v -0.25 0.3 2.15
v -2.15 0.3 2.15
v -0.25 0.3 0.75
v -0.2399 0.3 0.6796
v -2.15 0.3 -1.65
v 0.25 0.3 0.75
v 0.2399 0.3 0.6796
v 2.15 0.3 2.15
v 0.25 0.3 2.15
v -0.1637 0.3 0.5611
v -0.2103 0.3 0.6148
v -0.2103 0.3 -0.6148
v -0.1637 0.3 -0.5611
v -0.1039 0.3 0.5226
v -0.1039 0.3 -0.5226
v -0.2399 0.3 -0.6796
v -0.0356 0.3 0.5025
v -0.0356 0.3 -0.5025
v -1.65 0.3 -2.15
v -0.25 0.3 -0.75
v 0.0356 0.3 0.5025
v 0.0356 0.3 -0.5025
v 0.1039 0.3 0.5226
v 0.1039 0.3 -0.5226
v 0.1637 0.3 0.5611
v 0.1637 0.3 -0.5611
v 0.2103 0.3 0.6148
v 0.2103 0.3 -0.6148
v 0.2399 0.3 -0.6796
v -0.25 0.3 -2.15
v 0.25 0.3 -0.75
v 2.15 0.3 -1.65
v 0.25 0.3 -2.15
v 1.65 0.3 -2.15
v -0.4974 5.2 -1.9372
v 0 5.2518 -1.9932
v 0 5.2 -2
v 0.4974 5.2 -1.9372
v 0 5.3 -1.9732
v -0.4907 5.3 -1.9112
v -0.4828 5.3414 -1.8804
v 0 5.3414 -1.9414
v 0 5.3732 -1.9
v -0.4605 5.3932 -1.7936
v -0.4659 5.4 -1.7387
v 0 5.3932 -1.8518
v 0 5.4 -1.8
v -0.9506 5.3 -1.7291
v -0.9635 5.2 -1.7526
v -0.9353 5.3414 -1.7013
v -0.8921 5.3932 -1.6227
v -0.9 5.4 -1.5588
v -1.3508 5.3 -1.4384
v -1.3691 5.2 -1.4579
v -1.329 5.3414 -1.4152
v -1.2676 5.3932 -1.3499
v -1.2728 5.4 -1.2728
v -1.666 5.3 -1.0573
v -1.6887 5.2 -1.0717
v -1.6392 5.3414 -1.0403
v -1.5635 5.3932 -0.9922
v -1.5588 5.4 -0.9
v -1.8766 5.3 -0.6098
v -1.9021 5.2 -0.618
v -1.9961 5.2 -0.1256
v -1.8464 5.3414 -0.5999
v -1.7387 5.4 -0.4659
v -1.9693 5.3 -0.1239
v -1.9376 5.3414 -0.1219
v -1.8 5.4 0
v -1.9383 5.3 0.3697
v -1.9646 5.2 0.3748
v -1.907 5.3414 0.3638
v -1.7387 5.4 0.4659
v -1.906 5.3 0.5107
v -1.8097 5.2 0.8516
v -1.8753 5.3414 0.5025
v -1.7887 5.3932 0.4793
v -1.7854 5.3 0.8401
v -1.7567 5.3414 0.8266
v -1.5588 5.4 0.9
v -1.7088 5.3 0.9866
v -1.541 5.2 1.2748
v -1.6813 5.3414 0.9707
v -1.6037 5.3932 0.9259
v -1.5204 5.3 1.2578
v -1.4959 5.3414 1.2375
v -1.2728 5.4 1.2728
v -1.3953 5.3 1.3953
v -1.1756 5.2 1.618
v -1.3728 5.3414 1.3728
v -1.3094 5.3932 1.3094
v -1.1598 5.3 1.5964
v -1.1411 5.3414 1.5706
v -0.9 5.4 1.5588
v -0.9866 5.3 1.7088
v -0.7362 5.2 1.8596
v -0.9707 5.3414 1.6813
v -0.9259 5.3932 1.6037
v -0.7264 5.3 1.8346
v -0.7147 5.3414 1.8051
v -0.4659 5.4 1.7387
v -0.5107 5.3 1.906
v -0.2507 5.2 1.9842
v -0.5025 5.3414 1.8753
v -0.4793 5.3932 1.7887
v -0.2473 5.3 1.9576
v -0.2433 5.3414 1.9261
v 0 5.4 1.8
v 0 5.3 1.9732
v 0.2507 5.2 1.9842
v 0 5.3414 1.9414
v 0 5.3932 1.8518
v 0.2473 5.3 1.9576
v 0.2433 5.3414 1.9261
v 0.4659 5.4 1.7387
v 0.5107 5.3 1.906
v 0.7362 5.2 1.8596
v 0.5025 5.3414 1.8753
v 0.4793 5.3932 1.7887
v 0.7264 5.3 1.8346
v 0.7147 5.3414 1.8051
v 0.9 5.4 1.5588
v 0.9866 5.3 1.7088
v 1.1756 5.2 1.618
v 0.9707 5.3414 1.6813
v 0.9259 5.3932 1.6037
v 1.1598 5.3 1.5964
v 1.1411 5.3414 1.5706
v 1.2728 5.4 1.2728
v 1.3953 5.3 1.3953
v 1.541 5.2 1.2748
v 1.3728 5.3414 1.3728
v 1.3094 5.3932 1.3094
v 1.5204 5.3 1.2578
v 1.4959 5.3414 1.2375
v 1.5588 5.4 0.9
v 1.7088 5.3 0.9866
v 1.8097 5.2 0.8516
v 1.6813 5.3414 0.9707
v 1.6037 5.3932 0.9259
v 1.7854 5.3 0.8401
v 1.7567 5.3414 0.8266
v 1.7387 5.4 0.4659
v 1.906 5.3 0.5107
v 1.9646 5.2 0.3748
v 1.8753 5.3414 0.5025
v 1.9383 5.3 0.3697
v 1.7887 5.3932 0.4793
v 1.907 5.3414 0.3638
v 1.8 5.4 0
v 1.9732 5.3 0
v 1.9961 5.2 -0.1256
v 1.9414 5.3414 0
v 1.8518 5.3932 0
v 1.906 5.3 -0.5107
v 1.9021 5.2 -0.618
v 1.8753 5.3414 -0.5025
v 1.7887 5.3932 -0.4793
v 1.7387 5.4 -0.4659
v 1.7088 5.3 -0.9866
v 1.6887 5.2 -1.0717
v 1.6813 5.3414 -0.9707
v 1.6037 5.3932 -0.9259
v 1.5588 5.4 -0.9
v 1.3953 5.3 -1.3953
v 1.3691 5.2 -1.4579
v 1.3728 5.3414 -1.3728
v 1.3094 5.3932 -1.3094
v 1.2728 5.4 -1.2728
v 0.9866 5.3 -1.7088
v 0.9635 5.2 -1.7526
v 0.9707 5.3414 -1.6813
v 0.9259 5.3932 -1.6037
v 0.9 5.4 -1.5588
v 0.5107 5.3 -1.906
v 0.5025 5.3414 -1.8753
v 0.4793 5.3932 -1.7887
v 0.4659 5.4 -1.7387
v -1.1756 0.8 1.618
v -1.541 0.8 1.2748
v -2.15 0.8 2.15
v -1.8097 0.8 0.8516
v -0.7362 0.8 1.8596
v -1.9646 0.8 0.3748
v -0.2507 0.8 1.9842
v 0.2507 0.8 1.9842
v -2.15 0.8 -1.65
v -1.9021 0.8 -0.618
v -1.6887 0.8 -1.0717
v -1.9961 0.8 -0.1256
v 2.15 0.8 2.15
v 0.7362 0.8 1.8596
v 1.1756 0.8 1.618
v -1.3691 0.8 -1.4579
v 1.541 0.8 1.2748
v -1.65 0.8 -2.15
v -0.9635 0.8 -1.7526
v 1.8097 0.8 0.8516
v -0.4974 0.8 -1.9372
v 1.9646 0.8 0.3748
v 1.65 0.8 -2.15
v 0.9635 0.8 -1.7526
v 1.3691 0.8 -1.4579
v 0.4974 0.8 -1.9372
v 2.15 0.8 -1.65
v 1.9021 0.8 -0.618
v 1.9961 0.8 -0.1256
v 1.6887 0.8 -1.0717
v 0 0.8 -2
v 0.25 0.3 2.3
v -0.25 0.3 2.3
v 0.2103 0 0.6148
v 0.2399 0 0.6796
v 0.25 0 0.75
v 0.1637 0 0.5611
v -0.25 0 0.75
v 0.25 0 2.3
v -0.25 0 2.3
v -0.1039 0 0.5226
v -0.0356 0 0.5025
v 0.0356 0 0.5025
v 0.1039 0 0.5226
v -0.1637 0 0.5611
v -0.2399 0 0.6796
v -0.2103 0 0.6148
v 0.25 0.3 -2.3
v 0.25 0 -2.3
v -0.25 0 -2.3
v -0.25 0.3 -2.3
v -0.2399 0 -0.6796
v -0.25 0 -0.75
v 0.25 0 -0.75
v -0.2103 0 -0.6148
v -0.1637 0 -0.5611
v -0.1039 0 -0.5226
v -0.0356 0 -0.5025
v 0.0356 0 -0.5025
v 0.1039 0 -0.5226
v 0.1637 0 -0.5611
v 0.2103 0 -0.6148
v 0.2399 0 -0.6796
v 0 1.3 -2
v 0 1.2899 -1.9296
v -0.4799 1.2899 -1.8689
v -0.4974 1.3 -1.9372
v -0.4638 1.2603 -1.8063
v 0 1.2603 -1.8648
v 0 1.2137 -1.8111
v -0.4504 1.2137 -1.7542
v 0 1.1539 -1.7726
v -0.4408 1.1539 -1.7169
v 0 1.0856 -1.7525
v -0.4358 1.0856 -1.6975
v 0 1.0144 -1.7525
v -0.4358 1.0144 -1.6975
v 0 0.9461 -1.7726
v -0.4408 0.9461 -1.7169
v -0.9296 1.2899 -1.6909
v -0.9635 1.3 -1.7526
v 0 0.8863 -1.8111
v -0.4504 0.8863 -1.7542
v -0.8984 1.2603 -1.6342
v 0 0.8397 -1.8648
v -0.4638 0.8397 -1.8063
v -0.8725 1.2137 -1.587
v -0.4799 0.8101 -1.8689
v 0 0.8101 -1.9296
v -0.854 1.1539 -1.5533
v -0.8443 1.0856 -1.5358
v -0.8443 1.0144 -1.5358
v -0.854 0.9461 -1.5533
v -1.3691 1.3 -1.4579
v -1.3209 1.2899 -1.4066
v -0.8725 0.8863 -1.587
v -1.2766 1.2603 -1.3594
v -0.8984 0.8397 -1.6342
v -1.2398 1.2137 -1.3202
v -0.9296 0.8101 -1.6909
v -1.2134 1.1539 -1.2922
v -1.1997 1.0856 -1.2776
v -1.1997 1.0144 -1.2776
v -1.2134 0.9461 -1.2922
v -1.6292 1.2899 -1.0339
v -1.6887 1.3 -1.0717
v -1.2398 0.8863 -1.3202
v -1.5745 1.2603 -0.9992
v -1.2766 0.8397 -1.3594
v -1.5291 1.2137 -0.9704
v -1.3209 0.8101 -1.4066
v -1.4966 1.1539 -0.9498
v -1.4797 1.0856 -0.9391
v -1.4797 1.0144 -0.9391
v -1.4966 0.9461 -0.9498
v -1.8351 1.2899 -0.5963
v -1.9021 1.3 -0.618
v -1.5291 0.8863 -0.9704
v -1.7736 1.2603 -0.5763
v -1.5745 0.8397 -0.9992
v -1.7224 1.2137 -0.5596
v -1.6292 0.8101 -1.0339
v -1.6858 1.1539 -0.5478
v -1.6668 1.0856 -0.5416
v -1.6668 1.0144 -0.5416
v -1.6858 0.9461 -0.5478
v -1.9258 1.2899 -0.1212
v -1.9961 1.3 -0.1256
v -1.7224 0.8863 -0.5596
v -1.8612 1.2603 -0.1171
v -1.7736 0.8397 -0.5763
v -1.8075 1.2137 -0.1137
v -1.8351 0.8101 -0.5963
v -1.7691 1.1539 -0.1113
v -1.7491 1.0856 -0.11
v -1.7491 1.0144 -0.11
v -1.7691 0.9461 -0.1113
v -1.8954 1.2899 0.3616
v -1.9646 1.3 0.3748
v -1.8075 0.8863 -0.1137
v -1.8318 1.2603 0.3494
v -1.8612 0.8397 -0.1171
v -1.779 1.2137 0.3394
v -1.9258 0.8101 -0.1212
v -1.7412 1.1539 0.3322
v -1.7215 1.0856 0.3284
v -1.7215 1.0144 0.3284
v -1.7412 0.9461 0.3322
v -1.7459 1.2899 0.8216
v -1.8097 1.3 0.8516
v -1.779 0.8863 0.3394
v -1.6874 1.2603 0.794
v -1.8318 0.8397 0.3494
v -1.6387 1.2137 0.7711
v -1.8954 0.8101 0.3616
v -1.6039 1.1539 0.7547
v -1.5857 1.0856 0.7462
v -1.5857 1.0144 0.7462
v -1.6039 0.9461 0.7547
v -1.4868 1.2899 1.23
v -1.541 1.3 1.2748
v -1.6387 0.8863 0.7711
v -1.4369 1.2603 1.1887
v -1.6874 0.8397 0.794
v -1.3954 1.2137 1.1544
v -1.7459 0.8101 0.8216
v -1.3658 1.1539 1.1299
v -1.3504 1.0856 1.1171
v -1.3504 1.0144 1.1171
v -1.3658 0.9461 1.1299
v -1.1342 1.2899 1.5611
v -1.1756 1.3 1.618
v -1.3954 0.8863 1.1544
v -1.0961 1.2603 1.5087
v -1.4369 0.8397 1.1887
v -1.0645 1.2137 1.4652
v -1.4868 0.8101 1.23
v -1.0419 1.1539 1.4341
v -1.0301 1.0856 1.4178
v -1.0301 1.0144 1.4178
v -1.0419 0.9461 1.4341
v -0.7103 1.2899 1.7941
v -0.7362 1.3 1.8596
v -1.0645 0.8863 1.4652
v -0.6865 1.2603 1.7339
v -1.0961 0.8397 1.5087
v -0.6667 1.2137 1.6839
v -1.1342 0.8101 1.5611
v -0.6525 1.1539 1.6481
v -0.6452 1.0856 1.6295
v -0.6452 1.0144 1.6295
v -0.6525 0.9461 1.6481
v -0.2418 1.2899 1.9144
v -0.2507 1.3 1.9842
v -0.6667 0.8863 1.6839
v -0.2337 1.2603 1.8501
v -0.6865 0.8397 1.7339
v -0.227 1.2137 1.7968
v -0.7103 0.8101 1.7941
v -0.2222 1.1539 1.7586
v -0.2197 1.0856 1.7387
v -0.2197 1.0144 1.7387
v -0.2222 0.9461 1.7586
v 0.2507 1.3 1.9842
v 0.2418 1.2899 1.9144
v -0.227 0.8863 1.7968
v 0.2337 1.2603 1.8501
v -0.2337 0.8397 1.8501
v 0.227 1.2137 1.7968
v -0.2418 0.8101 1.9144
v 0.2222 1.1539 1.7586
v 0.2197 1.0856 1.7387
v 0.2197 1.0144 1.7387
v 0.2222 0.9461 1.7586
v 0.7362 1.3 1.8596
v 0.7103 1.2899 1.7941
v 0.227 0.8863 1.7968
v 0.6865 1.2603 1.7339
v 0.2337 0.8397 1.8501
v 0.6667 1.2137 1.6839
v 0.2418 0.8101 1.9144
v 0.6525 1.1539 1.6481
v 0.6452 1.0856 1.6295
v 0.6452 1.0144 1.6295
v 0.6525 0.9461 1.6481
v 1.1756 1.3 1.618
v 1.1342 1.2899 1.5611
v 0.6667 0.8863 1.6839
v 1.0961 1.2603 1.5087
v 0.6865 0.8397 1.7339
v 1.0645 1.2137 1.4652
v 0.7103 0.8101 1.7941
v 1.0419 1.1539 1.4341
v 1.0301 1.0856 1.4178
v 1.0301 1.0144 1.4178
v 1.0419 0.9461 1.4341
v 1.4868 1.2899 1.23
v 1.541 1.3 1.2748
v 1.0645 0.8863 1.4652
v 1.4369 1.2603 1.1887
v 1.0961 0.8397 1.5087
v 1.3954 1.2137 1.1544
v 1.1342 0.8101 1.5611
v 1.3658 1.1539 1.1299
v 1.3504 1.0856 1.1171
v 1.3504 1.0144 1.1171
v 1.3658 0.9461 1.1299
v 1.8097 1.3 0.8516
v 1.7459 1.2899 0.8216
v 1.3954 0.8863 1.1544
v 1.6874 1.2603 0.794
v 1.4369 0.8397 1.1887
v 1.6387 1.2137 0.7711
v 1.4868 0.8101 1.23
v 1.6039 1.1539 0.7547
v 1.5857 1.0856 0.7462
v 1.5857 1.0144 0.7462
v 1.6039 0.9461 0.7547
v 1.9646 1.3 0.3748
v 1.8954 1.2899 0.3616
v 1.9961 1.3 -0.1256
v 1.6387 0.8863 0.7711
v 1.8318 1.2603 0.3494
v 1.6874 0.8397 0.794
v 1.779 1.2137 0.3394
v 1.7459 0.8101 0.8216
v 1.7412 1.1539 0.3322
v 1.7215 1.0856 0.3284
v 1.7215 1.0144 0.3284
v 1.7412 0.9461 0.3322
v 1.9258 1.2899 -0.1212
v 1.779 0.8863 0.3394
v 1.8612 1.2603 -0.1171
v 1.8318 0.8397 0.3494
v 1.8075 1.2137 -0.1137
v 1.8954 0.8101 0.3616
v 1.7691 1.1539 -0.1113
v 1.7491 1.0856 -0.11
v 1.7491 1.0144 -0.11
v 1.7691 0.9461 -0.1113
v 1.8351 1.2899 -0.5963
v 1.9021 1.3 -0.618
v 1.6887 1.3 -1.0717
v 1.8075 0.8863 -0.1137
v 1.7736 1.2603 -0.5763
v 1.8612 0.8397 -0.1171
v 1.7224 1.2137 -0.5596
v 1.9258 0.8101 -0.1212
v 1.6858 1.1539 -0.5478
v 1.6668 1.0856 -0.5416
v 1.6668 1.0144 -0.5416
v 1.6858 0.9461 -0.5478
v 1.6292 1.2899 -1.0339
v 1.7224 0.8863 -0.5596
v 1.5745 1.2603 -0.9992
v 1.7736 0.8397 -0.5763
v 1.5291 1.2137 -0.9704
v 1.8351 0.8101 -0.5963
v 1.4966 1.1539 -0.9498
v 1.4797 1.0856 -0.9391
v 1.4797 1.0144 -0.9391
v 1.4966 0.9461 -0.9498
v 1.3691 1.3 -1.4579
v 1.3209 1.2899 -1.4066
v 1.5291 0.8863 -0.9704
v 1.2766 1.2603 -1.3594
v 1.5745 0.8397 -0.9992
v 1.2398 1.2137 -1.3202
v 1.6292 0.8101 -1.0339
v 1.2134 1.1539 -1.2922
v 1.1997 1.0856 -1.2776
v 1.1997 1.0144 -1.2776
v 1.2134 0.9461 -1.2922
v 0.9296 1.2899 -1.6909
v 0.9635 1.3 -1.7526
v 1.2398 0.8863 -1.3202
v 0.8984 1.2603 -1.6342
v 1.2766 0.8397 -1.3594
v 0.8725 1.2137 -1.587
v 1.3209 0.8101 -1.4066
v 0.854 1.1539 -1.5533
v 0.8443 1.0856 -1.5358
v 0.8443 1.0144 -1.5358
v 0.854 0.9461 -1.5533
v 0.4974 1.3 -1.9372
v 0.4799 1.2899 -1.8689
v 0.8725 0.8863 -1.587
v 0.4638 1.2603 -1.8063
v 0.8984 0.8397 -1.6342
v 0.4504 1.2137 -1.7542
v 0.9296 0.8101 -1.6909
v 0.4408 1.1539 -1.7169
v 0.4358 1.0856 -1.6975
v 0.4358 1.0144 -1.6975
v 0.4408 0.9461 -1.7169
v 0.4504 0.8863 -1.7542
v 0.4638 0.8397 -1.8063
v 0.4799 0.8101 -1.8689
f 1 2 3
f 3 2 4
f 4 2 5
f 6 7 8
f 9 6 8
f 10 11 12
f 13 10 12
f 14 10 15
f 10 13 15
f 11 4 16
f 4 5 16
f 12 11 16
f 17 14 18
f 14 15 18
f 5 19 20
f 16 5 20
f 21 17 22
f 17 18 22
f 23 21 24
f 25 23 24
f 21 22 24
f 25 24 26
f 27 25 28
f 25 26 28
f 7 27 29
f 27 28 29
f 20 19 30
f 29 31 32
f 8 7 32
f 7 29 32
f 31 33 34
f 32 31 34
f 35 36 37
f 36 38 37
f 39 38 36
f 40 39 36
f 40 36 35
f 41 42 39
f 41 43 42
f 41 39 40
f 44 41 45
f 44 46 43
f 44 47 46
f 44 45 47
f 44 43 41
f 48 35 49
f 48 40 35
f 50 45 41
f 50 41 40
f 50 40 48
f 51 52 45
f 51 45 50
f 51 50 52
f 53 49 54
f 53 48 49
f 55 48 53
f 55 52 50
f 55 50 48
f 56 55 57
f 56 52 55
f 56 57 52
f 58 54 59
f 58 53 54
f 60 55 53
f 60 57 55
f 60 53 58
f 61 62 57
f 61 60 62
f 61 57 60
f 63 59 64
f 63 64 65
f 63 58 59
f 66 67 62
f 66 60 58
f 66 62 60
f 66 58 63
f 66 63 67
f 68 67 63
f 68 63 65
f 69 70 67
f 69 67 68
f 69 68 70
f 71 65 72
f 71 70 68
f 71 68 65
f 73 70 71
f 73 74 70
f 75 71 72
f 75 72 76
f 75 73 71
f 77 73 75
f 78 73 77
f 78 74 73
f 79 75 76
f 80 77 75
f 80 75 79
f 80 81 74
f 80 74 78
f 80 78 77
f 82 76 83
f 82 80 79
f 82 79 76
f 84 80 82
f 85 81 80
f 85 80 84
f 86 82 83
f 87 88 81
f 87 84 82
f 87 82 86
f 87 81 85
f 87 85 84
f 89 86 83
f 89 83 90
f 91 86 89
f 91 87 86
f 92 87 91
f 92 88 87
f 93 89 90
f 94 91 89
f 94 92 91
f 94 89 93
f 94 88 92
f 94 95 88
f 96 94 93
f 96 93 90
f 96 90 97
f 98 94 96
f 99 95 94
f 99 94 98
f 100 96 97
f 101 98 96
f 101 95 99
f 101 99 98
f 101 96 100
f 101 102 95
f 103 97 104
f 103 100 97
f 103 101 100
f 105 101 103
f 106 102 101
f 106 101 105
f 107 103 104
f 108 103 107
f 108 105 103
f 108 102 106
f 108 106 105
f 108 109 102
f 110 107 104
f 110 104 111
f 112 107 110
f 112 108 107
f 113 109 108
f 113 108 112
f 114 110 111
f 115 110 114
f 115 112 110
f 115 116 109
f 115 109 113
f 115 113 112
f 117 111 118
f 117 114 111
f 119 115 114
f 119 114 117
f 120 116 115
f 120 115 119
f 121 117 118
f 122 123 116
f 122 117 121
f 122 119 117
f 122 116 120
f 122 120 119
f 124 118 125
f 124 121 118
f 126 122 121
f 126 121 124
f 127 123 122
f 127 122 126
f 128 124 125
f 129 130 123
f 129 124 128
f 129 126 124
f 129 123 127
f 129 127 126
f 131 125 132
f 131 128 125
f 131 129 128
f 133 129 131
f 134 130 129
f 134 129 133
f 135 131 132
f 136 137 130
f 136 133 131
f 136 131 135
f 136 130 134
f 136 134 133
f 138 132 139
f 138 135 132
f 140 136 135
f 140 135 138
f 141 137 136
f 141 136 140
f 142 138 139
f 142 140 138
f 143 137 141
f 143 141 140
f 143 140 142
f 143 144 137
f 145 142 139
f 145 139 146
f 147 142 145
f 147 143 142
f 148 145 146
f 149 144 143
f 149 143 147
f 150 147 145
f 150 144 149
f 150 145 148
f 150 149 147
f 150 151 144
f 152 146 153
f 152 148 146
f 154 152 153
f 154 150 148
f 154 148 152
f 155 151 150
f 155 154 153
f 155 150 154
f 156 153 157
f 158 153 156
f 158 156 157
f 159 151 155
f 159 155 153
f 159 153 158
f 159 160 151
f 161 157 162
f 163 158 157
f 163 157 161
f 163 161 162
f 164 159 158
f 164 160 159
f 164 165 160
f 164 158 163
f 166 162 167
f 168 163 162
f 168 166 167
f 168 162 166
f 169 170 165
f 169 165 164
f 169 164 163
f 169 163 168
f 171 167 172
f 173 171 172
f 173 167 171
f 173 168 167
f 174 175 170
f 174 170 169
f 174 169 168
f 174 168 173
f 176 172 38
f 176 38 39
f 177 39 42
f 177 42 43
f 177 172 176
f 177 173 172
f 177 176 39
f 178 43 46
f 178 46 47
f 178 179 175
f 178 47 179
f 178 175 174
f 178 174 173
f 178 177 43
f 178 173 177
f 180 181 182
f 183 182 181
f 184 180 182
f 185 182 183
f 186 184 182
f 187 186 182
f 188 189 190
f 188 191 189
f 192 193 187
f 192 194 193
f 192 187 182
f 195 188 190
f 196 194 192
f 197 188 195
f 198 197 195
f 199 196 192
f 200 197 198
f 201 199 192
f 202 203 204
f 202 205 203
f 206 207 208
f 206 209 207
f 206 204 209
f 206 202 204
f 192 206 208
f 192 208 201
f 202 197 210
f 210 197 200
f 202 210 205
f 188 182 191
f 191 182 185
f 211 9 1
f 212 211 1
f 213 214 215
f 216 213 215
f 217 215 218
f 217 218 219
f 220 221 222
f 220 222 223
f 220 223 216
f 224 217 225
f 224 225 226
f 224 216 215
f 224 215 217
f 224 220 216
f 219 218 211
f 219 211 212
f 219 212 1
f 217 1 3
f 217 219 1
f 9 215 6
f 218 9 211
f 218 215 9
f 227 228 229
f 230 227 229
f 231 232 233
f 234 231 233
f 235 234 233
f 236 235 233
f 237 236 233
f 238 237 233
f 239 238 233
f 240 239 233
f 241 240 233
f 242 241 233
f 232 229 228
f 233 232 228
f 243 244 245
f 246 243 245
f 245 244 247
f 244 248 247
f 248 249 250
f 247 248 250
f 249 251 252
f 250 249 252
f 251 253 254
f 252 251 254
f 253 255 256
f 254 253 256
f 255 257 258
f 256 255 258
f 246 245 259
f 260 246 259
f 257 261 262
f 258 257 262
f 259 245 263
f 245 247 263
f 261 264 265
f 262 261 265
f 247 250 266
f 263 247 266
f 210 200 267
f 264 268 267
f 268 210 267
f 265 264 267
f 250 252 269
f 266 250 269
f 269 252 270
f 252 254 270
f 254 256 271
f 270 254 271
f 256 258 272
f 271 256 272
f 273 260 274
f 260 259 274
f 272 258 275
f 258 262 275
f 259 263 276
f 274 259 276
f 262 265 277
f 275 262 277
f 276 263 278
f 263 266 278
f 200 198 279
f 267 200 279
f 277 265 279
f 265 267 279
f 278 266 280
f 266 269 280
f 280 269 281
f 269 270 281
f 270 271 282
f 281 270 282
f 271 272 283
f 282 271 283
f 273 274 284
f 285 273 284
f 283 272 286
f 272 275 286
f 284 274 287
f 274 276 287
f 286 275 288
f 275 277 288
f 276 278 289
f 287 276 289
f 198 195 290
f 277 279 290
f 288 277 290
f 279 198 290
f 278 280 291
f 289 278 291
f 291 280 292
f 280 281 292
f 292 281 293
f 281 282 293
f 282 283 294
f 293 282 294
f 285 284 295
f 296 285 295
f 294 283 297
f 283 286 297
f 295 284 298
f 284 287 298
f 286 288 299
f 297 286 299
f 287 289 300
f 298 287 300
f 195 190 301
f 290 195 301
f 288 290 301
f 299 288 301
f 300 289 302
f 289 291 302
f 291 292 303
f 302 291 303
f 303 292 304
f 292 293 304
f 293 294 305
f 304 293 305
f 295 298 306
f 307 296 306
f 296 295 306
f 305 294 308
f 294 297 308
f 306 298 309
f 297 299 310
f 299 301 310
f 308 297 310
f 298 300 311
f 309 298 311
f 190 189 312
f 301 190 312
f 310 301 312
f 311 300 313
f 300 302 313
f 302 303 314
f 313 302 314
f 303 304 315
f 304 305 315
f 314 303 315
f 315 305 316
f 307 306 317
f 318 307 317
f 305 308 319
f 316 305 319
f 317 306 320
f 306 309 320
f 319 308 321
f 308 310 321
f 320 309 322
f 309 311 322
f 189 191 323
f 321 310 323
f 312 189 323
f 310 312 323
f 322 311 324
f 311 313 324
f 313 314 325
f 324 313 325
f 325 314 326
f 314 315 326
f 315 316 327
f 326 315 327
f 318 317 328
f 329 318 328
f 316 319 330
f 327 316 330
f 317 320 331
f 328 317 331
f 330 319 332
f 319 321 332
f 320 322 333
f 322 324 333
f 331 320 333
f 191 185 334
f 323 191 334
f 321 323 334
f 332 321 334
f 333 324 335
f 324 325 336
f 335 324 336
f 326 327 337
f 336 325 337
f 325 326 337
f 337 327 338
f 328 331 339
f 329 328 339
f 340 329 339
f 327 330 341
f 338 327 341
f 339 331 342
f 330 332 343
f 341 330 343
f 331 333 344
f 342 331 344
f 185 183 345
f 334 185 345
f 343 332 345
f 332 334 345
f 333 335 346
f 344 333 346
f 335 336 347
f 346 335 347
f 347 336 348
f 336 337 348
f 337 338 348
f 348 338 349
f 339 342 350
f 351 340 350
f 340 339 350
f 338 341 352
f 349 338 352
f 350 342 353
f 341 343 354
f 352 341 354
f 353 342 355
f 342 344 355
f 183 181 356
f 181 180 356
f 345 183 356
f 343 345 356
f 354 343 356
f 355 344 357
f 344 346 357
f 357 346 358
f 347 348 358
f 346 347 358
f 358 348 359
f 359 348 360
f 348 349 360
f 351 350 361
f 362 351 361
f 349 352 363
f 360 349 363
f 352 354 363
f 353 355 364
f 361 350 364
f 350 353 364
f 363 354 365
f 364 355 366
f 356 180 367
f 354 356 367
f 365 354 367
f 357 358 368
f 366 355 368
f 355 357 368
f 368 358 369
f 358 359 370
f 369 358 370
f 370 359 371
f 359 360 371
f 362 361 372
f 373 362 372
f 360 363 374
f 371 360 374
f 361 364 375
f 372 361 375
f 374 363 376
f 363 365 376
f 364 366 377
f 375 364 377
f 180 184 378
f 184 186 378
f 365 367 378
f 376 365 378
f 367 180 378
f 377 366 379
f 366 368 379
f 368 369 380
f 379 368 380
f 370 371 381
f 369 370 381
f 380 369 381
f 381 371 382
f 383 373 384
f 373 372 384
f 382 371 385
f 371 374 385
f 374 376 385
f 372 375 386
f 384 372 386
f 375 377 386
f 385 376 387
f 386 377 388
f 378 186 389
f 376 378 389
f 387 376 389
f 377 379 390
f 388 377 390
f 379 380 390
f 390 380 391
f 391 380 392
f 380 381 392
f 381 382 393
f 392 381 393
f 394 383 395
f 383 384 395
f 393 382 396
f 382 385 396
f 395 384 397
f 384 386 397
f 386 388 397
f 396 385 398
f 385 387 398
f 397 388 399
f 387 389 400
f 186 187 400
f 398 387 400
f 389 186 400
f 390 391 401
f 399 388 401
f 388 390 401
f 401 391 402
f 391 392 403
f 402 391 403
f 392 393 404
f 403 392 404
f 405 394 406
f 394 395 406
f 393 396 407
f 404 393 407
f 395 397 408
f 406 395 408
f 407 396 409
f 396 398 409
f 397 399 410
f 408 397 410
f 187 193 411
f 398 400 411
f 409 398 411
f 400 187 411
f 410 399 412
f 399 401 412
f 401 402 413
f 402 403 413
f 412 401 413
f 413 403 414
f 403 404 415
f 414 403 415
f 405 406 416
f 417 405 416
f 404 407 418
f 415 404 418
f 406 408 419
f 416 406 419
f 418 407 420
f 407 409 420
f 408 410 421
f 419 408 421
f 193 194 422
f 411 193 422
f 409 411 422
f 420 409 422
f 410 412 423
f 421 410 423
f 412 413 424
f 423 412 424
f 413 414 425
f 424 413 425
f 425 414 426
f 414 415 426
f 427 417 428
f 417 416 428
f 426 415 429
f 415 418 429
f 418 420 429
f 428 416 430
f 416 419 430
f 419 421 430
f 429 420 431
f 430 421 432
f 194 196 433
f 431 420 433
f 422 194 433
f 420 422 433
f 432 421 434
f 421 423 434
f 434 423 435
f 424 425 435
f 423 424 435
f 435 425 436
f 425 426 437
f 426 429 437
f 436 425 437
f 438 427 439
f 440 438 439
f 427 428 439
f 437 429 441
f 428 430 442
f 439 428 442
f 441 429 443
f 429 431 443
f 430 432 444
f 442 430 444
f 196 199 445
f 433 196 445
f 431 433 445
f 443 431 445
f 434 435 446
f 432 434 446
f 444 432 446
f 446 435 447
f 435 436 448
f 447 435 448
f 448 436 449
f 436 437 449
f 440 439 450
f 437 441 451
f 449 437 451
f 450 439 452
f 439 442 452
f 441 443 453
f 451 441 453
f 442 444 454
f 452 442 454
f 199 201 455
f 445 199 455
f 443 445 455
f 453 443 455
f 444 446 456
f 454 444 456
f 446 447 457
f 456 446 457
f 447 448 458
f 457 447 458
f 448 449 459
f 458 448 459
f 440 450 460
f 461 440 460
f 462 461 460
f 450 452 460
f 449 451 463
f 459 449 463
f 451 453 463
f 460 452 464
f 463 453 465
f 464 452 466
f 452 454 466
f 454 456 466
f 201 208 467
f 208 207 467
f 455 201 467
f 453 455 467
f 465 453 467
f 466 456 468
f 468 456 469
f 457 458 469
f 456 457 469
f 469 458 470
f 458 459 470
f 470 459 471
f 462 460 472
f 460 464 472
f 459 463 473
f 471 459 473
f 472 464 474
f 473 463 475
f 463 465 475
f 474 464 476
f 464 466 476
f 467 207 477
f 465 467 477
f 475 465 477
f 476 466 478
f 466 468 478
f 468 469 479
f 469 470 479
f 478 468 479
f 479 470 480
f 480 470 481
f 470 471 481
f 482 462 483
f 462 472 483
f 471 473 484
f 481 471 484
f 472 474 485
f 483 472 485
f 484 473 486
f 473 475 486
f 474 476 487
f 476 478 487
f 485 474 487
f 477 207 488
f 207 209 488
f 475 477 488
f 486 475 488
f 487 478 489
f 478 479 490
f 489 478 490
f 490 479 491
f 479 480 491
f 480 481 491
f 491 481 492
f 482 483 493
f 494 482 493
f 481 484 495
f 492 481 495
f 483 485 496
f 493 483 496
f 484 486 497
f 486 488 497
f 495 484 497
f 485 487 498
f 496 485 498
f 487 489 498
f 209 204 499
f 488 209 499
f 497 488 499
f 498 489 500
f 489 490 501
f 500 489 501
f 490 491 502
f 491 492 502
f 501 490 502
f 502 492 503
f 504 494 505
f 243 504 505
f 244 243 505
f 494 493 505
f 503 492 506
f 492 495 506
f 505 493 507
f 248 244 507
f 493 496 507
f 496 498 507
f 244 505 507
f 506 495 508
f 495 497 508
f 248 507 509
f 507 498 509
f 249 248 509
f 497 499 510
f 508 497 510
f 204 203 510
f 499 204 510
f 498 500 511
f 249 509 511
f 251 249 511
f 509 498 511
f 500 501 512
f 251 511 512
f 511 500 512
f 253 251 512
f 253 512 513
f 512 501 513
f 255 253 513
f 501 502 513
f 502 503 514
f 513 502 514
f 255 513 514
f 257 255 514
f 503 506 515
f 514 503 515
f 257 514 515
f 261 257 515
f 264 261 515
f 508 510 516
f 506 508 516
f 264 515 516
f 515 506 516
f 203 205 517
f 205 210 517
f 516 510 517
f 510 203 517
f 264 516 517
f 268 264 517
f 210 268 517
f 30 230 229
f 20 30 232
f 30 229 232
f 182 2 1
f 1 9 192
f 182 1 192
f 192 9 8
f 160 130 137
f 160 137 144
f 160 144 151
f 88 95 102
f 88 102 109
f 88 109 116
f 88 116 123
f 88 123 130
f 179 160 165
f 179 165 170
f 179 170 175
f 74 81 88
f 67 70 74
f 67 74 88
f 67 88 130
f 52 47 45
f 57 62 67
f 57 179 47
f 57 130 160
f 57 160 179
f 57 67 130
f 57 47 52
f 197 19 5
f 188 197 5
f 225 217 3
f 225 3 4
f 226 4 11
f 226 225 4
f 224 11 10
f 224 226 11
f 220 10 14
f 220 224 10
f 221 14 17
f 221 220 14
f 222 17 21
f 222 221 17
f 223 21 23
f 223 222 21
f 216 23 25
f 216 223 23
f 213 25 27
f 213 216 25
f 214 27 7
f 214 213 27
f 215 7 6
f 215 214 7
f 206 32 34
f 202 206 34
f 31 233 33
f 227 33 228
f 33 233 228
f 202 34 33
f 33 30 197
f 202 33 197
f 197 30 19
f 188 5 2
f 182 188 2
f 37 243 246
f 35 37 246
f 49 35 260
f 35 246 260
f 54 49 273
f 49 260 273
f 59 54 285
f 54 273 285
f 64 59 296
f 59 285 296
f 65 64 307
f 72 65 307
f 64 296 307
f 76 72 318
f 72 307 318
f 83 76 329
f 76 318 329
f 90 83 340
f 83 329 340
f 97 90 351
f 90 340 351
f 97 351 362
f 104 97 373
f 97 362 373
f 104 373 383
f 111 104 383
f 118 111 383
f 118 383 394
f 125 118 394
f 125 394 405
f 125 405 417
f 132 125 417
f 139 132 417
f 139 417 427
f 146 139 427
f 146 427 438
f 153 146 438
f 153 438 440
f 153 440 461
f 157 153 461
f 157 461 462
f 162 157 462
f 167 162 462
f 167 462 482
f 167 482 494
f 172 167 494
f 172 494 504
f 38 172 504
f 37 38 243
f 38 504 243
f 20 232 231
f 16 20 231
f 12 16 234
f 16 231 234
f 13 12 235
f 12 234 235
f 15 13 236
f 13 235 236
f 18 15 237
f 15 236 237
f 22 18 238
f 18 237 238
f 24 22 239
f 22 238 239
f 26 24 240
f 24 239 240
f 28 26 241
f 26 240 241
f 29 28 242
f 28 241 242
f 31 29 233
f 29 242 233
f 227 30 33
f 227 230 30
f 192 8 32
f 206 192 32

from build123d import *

# Parameters (mm, degrees)
BOSS_EXTRUDE1_DEPTH   = 0.3
BOSS_EXTRUDE1_2_DEPTH = 0.3
BOSS_EXTRUDE2_DEPTH   = 0.5
SKETCH4_R             = 2
BOSS_EXTRUDE3_DEPTH   = 4.6
FILLET1_R             = 0.2
SKETCH6_R             = 0.25


with BuildPart() as part:
    # Sketch1 → Boss-Extrude1 (new body)
    with BuildSketch(Plane(origin=(0, 0, 0), x_dir=(1, 0, 0), z_dir=(0, 1, 0))):
        with BuildLine():
            Line((0.25, 0.75), (0.25, 2.3))
            Line((0.25, 2.3), (-0.25, 2.3))
            Line((-0.25, 2.3), (-0.25, 0.75))
            ThreePointArc((-0.25, 0.75), (0, 0.5), (0.25, 0.75))
        make_face()
    extrude(amount=BOSS_EXTRUDE1_DEPTH)



with BuildPart() as body_2:
    # Sketch1 → Boss-Extrude1 2 (new body)
    with BuildSketch(Plane(origin=(0, 0, 0), x_dir=(1, 0, 0), z_dir=(0, 1, 0))):
        with BuildLine():
            Line((0.25, -0.75), (0.25, -2.3))
            Line((0.25, -2.3), (-0.25, -2.3))
            Line((-0.25, -2.3), (-0.25, -0.75))
            ThreePointArc((-0.25, -0.75), (0, -0.5), (0.25, -0.75))
        make_face()
    extrude(amount=BOSS_EXTRUDE1_2_DEPTH)


with BuildPart() as part_1:
    add(part.part)

    add(body_2.part)  # Boss-Extrude2 merges body 2
    # Sketch3 → Boss-Extrude2 (add)
    with BuildSketch(Plane(origin=(0, 0.3, 0), x_dir=(1, 0, 0), z_dir=(0, 1, 0))):
        Polygon((-2.15, -2.15), (2.15, -2.15), (2.15, 1.65), (1.65, 2.15), (-1.65, 2.15), (-2.15, 1.65), align=None)
    extrude(amount=BOSS_EXTRUDE2_DEPTH)

    # Sketch4 → Boss-Extrude3 (add)
    with BuildSketch(Plane(origin=(0, 0.8, 0), x_dir=(1, 0, 0), z_dir=(0, 1, 0))):
        with Locations(Location((0, 0, 0), (0, 0, 90))):
            Circle(SKETCH4_R)
    extrude(amount=BOSS_EXTRUDE3_DEPTH)

    # Fillet1
    fillet1_edges = [part_1.edges().sort_by_distance(p)[0] for p in [
        (0, 5.4, 2),
    ]]
    fillet(fillet1_edges, radius=FILLET1_R)

    # Sketch6 → Cut-Revolve1 (revolve, cut)
    with BuildSketch(Plane.XY, mode=Mode.PRIVATE) as cut_revolve1_sk:
        with Locations((2, 1.05)):
            Circle(SKETCH6_R)
    revolve(cut_revolve1_sk.sketch.rotate(Axis((0, 0, 0), (0, 1, 0)), 90), axis=Axis((0, 0, 0), (0, 1, 0)), mode=Mode.SUBTRACT)


solid = part_1.part
